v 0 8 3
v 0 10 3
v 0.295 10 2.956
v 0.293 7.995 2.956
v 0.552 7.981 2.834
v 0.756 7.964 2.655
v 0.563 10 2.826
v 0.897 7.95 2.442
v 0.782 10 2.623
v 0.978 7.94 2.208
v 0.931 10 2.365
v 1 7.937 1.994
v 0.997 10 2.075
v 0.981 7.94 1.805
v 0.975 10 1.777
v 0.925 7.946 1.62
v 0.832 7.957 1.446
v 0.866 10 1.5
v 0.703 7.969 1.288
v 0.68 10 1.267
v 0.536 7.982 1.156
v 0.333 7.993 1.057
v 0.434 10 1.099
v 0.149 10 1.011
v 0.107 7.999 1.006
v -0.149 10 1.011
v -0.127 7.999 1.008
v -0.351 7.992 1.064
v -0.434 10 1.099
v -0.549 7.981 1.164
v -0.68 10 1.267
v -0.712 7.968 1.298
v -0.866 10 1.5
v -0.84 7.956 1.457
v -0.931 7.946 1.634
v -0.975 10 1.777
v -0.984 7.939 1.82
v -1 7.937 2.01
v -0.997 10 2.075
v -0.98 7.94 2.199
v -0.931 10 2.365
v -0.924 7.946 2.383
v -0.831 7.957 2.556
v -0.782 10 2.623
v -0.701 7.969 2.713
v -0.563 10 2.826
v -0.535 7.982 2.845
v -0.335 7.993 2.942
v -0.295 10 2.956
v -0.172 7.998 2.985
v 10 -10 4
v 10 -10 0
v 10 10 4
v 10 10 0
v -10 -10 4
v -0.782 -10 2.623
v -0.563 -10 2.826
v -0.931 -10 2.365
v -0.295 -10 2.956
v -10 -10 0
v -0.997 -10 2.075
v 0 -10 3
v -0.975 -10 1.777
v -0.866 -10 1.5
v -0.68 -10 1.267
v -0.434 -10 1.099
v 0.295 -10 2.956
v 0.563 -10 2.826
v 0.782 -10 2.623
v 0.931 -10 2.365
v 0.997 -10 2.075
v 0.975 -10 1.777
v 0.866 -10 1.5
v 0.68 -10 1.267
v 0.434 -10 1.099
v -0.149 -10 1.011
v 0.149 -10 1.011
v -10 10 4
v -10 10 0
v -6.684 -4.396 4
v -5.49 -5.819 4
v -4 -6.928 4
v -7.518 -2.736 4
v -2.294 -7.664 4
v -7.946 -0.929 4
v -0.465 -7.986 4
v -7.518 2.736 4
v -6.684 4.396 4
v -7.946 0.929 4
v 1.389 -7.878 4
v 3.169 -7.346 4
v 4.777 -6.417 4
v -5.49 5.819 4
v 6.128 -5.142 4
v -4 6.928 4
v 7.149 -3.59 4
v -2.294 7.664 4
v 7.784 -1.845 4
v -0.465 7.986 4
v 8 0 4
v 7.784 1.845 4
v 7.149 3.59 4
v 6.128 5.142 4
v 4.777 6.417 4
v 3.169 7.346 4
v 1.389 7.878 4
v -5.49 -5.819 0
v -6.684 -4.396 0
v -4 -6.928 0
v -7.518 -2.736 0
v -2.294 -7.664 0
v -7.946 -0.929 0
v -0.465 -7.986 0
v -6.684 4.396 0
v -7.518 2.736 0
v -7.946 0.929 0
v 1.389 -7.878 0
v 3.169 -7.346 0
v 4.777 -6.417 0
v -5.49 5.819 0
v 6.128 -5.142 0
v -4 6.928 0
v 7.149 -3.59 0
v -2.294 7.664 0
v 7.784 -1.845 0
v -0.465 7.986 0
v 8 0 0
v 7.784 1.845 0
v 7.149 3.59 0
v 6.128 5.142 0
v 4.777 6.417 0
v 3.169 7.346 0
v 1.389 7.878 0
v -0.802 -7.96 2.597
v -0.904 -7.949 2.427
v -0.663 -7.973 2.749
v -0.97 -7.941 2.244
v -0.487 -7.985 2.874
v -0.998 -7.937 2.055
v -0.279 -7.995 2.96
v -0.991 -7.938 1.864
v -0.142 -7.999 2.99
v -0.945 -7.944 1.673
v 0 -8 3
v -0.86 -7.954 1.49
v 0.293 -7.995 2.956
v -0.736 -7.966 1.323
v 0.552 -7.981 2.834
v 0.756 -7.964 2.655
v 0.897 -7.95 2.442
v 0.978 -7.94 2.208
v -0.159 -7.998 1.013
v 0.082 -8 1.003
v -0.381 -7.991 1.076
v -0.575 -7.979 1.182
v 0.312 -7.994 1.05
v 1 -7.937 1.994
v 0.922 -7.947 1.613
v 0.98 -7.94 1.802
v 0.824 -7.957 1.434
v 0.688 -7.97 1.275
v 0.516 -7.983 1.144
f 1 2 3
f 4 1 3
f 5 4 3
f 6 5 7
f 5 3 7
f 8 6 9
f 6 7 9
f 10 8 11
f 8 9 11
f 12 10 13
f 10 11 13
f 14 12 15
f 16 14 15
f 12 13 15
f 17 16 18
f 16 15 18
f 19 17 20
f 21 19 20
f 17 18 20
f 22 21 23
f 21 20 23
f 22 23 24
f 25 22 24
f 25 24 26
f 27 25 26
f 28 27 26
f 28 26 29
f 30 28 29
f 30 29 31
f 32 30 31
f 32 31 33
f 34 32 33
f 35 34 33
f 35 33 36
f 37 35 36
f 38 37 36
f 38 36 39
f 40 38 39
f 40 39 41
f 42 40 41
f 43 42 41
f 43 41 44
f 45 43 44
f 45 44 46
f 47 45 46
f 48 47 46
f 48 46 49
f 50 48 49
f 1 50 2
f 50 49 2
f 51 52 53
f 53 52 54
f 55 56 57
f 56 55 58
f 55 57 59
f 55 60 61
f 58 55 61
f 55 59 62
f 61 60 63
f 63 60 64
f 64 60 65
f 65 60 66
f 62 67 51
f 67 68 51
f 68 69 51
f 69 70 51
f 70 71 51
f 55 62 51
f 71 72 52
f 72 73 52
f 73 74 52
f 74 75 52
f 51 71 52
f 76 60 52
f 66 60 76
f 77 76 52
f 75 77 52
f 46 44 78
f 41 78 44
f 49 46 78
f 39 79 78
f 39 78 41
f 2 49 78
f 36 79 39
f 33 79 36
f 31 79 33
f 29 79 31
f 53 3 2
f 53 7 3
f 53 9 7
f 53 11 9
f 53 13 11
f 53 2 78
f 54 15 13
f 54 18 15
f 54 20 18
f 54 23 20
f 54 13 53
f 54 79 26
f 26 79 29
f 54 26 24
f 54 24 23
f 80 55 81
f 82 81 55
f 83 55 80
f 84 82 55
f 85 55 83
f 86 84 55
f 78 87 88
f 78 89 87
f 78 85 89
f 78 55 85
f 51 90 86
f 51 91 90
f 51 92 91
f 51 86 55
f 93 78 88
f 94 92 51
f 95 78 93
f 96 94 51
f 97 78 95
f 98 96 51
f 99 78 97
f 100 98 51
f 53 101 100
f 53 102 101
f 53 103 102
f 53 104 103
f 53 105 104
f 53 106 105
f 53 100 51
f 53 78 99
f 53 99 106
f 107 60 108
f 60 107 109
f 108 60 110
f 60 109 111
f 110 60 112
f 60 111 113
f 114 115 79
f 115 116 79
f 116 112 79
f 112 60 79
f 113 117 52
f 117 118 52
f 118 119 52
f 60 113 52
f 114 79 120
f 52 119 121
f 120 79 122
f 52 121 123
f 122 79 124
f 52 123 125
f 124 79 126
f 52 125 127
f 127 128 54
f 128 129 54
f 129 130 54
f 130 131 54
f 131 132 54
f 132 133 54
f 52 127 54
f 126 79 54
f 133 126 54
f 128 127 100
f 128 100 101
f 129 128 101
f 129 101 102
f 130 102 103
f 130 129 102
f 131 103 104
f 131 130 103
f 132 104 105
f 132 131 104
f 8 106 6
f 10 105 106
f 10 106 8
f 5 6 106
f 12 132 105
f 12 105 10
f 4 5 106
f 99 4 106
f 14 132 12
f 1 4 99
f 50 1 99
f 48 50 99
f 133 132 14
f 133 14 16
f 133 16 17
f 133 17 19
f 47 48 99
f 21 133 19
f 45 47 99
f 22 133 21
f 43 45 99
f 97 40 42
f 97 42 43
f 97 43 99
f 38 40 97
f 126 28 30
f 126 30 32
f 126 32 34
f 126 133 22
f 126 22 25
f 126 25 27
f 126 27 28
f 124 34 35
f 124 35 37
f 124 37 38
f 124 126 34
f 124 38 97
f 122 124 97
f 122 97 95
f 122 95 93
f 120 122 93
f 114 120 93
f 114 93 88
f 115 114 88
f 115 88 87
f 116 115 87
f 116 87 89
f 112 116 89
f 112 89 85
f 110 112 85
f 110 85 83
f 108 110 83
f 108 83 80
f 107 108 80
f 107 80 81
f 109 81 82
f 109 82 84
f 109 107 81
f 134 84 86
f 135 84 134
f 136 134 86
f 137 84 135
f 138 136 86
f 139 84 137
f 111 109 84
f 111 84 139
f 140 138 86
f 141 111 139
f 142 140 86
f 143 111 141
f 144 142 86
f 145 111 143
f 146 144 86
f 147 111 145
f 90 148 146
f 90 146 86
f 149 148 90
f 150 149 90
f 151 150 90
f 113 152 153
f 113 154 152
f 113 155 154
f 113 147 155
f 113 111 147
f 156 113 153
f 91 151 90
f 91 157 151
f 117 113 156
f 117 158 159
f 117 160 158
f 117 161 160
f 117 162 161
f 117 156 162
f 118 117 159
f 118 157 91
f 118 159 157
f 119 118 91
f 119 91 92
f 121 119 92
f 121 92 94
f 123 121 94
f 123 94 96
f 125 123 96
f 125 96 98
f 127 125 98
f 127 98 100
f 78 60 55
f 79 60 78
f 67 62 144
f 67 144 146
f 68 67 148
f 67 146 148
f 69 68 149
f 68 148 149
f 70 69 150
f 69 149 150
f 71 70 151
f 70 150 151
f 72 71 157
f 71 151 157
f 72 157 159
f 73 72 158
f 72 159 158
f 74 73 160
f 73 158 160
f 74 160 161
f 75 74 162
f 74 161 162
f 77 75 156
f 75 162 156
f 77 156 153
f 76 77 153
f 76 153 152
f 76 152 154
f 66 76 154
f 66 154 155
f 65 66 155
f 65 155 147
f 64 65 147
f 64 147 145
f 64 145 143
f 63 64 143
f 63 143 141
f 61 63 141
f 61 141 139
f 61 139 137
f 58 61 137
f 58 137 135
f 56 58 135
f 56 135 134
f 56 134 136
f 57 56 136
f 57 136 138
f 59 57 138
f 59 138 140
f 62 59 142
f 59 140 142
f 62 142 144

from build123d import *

# Parameters (mm, degrees)
SKETCH1_W           = 20
SKETCH1_H           = 20
SKETCH1_R           = 8
BOSS_EXTRUDE1_DEPTH = 4
SKETCH3_R           = 1
CUT_EXTRUDE1_DEPTH  = 20


with BuildPart() as part:
    # Sketch1 → Boss-Extrude1 (new body)
    with BuildSketch(Plane.XY):
        Rectangle(SKETCH1_W, SKETCH1_H)
        Circle(SKETCH1_R, mode=Mode.SUBTRACT)
    extrude(amount=BOSS_EXTRUDE1_DEPTH)

    # Sketch3 → Cut-Extrude1 (cut)
    with BuildSketch(Plane(origin=(0, 10, 0), x_dir=(1, 0, 0), z_dir=(0, 1, 0))):
        with Locations(Location((0, -2, 0), (0, 0, 270))):
            Circle(SKETCH3_R)
    extrude(amount=-CUT_EXTRUDE1_DEPTH, mode=Mode.SUBTRACT)


solid = part.part
